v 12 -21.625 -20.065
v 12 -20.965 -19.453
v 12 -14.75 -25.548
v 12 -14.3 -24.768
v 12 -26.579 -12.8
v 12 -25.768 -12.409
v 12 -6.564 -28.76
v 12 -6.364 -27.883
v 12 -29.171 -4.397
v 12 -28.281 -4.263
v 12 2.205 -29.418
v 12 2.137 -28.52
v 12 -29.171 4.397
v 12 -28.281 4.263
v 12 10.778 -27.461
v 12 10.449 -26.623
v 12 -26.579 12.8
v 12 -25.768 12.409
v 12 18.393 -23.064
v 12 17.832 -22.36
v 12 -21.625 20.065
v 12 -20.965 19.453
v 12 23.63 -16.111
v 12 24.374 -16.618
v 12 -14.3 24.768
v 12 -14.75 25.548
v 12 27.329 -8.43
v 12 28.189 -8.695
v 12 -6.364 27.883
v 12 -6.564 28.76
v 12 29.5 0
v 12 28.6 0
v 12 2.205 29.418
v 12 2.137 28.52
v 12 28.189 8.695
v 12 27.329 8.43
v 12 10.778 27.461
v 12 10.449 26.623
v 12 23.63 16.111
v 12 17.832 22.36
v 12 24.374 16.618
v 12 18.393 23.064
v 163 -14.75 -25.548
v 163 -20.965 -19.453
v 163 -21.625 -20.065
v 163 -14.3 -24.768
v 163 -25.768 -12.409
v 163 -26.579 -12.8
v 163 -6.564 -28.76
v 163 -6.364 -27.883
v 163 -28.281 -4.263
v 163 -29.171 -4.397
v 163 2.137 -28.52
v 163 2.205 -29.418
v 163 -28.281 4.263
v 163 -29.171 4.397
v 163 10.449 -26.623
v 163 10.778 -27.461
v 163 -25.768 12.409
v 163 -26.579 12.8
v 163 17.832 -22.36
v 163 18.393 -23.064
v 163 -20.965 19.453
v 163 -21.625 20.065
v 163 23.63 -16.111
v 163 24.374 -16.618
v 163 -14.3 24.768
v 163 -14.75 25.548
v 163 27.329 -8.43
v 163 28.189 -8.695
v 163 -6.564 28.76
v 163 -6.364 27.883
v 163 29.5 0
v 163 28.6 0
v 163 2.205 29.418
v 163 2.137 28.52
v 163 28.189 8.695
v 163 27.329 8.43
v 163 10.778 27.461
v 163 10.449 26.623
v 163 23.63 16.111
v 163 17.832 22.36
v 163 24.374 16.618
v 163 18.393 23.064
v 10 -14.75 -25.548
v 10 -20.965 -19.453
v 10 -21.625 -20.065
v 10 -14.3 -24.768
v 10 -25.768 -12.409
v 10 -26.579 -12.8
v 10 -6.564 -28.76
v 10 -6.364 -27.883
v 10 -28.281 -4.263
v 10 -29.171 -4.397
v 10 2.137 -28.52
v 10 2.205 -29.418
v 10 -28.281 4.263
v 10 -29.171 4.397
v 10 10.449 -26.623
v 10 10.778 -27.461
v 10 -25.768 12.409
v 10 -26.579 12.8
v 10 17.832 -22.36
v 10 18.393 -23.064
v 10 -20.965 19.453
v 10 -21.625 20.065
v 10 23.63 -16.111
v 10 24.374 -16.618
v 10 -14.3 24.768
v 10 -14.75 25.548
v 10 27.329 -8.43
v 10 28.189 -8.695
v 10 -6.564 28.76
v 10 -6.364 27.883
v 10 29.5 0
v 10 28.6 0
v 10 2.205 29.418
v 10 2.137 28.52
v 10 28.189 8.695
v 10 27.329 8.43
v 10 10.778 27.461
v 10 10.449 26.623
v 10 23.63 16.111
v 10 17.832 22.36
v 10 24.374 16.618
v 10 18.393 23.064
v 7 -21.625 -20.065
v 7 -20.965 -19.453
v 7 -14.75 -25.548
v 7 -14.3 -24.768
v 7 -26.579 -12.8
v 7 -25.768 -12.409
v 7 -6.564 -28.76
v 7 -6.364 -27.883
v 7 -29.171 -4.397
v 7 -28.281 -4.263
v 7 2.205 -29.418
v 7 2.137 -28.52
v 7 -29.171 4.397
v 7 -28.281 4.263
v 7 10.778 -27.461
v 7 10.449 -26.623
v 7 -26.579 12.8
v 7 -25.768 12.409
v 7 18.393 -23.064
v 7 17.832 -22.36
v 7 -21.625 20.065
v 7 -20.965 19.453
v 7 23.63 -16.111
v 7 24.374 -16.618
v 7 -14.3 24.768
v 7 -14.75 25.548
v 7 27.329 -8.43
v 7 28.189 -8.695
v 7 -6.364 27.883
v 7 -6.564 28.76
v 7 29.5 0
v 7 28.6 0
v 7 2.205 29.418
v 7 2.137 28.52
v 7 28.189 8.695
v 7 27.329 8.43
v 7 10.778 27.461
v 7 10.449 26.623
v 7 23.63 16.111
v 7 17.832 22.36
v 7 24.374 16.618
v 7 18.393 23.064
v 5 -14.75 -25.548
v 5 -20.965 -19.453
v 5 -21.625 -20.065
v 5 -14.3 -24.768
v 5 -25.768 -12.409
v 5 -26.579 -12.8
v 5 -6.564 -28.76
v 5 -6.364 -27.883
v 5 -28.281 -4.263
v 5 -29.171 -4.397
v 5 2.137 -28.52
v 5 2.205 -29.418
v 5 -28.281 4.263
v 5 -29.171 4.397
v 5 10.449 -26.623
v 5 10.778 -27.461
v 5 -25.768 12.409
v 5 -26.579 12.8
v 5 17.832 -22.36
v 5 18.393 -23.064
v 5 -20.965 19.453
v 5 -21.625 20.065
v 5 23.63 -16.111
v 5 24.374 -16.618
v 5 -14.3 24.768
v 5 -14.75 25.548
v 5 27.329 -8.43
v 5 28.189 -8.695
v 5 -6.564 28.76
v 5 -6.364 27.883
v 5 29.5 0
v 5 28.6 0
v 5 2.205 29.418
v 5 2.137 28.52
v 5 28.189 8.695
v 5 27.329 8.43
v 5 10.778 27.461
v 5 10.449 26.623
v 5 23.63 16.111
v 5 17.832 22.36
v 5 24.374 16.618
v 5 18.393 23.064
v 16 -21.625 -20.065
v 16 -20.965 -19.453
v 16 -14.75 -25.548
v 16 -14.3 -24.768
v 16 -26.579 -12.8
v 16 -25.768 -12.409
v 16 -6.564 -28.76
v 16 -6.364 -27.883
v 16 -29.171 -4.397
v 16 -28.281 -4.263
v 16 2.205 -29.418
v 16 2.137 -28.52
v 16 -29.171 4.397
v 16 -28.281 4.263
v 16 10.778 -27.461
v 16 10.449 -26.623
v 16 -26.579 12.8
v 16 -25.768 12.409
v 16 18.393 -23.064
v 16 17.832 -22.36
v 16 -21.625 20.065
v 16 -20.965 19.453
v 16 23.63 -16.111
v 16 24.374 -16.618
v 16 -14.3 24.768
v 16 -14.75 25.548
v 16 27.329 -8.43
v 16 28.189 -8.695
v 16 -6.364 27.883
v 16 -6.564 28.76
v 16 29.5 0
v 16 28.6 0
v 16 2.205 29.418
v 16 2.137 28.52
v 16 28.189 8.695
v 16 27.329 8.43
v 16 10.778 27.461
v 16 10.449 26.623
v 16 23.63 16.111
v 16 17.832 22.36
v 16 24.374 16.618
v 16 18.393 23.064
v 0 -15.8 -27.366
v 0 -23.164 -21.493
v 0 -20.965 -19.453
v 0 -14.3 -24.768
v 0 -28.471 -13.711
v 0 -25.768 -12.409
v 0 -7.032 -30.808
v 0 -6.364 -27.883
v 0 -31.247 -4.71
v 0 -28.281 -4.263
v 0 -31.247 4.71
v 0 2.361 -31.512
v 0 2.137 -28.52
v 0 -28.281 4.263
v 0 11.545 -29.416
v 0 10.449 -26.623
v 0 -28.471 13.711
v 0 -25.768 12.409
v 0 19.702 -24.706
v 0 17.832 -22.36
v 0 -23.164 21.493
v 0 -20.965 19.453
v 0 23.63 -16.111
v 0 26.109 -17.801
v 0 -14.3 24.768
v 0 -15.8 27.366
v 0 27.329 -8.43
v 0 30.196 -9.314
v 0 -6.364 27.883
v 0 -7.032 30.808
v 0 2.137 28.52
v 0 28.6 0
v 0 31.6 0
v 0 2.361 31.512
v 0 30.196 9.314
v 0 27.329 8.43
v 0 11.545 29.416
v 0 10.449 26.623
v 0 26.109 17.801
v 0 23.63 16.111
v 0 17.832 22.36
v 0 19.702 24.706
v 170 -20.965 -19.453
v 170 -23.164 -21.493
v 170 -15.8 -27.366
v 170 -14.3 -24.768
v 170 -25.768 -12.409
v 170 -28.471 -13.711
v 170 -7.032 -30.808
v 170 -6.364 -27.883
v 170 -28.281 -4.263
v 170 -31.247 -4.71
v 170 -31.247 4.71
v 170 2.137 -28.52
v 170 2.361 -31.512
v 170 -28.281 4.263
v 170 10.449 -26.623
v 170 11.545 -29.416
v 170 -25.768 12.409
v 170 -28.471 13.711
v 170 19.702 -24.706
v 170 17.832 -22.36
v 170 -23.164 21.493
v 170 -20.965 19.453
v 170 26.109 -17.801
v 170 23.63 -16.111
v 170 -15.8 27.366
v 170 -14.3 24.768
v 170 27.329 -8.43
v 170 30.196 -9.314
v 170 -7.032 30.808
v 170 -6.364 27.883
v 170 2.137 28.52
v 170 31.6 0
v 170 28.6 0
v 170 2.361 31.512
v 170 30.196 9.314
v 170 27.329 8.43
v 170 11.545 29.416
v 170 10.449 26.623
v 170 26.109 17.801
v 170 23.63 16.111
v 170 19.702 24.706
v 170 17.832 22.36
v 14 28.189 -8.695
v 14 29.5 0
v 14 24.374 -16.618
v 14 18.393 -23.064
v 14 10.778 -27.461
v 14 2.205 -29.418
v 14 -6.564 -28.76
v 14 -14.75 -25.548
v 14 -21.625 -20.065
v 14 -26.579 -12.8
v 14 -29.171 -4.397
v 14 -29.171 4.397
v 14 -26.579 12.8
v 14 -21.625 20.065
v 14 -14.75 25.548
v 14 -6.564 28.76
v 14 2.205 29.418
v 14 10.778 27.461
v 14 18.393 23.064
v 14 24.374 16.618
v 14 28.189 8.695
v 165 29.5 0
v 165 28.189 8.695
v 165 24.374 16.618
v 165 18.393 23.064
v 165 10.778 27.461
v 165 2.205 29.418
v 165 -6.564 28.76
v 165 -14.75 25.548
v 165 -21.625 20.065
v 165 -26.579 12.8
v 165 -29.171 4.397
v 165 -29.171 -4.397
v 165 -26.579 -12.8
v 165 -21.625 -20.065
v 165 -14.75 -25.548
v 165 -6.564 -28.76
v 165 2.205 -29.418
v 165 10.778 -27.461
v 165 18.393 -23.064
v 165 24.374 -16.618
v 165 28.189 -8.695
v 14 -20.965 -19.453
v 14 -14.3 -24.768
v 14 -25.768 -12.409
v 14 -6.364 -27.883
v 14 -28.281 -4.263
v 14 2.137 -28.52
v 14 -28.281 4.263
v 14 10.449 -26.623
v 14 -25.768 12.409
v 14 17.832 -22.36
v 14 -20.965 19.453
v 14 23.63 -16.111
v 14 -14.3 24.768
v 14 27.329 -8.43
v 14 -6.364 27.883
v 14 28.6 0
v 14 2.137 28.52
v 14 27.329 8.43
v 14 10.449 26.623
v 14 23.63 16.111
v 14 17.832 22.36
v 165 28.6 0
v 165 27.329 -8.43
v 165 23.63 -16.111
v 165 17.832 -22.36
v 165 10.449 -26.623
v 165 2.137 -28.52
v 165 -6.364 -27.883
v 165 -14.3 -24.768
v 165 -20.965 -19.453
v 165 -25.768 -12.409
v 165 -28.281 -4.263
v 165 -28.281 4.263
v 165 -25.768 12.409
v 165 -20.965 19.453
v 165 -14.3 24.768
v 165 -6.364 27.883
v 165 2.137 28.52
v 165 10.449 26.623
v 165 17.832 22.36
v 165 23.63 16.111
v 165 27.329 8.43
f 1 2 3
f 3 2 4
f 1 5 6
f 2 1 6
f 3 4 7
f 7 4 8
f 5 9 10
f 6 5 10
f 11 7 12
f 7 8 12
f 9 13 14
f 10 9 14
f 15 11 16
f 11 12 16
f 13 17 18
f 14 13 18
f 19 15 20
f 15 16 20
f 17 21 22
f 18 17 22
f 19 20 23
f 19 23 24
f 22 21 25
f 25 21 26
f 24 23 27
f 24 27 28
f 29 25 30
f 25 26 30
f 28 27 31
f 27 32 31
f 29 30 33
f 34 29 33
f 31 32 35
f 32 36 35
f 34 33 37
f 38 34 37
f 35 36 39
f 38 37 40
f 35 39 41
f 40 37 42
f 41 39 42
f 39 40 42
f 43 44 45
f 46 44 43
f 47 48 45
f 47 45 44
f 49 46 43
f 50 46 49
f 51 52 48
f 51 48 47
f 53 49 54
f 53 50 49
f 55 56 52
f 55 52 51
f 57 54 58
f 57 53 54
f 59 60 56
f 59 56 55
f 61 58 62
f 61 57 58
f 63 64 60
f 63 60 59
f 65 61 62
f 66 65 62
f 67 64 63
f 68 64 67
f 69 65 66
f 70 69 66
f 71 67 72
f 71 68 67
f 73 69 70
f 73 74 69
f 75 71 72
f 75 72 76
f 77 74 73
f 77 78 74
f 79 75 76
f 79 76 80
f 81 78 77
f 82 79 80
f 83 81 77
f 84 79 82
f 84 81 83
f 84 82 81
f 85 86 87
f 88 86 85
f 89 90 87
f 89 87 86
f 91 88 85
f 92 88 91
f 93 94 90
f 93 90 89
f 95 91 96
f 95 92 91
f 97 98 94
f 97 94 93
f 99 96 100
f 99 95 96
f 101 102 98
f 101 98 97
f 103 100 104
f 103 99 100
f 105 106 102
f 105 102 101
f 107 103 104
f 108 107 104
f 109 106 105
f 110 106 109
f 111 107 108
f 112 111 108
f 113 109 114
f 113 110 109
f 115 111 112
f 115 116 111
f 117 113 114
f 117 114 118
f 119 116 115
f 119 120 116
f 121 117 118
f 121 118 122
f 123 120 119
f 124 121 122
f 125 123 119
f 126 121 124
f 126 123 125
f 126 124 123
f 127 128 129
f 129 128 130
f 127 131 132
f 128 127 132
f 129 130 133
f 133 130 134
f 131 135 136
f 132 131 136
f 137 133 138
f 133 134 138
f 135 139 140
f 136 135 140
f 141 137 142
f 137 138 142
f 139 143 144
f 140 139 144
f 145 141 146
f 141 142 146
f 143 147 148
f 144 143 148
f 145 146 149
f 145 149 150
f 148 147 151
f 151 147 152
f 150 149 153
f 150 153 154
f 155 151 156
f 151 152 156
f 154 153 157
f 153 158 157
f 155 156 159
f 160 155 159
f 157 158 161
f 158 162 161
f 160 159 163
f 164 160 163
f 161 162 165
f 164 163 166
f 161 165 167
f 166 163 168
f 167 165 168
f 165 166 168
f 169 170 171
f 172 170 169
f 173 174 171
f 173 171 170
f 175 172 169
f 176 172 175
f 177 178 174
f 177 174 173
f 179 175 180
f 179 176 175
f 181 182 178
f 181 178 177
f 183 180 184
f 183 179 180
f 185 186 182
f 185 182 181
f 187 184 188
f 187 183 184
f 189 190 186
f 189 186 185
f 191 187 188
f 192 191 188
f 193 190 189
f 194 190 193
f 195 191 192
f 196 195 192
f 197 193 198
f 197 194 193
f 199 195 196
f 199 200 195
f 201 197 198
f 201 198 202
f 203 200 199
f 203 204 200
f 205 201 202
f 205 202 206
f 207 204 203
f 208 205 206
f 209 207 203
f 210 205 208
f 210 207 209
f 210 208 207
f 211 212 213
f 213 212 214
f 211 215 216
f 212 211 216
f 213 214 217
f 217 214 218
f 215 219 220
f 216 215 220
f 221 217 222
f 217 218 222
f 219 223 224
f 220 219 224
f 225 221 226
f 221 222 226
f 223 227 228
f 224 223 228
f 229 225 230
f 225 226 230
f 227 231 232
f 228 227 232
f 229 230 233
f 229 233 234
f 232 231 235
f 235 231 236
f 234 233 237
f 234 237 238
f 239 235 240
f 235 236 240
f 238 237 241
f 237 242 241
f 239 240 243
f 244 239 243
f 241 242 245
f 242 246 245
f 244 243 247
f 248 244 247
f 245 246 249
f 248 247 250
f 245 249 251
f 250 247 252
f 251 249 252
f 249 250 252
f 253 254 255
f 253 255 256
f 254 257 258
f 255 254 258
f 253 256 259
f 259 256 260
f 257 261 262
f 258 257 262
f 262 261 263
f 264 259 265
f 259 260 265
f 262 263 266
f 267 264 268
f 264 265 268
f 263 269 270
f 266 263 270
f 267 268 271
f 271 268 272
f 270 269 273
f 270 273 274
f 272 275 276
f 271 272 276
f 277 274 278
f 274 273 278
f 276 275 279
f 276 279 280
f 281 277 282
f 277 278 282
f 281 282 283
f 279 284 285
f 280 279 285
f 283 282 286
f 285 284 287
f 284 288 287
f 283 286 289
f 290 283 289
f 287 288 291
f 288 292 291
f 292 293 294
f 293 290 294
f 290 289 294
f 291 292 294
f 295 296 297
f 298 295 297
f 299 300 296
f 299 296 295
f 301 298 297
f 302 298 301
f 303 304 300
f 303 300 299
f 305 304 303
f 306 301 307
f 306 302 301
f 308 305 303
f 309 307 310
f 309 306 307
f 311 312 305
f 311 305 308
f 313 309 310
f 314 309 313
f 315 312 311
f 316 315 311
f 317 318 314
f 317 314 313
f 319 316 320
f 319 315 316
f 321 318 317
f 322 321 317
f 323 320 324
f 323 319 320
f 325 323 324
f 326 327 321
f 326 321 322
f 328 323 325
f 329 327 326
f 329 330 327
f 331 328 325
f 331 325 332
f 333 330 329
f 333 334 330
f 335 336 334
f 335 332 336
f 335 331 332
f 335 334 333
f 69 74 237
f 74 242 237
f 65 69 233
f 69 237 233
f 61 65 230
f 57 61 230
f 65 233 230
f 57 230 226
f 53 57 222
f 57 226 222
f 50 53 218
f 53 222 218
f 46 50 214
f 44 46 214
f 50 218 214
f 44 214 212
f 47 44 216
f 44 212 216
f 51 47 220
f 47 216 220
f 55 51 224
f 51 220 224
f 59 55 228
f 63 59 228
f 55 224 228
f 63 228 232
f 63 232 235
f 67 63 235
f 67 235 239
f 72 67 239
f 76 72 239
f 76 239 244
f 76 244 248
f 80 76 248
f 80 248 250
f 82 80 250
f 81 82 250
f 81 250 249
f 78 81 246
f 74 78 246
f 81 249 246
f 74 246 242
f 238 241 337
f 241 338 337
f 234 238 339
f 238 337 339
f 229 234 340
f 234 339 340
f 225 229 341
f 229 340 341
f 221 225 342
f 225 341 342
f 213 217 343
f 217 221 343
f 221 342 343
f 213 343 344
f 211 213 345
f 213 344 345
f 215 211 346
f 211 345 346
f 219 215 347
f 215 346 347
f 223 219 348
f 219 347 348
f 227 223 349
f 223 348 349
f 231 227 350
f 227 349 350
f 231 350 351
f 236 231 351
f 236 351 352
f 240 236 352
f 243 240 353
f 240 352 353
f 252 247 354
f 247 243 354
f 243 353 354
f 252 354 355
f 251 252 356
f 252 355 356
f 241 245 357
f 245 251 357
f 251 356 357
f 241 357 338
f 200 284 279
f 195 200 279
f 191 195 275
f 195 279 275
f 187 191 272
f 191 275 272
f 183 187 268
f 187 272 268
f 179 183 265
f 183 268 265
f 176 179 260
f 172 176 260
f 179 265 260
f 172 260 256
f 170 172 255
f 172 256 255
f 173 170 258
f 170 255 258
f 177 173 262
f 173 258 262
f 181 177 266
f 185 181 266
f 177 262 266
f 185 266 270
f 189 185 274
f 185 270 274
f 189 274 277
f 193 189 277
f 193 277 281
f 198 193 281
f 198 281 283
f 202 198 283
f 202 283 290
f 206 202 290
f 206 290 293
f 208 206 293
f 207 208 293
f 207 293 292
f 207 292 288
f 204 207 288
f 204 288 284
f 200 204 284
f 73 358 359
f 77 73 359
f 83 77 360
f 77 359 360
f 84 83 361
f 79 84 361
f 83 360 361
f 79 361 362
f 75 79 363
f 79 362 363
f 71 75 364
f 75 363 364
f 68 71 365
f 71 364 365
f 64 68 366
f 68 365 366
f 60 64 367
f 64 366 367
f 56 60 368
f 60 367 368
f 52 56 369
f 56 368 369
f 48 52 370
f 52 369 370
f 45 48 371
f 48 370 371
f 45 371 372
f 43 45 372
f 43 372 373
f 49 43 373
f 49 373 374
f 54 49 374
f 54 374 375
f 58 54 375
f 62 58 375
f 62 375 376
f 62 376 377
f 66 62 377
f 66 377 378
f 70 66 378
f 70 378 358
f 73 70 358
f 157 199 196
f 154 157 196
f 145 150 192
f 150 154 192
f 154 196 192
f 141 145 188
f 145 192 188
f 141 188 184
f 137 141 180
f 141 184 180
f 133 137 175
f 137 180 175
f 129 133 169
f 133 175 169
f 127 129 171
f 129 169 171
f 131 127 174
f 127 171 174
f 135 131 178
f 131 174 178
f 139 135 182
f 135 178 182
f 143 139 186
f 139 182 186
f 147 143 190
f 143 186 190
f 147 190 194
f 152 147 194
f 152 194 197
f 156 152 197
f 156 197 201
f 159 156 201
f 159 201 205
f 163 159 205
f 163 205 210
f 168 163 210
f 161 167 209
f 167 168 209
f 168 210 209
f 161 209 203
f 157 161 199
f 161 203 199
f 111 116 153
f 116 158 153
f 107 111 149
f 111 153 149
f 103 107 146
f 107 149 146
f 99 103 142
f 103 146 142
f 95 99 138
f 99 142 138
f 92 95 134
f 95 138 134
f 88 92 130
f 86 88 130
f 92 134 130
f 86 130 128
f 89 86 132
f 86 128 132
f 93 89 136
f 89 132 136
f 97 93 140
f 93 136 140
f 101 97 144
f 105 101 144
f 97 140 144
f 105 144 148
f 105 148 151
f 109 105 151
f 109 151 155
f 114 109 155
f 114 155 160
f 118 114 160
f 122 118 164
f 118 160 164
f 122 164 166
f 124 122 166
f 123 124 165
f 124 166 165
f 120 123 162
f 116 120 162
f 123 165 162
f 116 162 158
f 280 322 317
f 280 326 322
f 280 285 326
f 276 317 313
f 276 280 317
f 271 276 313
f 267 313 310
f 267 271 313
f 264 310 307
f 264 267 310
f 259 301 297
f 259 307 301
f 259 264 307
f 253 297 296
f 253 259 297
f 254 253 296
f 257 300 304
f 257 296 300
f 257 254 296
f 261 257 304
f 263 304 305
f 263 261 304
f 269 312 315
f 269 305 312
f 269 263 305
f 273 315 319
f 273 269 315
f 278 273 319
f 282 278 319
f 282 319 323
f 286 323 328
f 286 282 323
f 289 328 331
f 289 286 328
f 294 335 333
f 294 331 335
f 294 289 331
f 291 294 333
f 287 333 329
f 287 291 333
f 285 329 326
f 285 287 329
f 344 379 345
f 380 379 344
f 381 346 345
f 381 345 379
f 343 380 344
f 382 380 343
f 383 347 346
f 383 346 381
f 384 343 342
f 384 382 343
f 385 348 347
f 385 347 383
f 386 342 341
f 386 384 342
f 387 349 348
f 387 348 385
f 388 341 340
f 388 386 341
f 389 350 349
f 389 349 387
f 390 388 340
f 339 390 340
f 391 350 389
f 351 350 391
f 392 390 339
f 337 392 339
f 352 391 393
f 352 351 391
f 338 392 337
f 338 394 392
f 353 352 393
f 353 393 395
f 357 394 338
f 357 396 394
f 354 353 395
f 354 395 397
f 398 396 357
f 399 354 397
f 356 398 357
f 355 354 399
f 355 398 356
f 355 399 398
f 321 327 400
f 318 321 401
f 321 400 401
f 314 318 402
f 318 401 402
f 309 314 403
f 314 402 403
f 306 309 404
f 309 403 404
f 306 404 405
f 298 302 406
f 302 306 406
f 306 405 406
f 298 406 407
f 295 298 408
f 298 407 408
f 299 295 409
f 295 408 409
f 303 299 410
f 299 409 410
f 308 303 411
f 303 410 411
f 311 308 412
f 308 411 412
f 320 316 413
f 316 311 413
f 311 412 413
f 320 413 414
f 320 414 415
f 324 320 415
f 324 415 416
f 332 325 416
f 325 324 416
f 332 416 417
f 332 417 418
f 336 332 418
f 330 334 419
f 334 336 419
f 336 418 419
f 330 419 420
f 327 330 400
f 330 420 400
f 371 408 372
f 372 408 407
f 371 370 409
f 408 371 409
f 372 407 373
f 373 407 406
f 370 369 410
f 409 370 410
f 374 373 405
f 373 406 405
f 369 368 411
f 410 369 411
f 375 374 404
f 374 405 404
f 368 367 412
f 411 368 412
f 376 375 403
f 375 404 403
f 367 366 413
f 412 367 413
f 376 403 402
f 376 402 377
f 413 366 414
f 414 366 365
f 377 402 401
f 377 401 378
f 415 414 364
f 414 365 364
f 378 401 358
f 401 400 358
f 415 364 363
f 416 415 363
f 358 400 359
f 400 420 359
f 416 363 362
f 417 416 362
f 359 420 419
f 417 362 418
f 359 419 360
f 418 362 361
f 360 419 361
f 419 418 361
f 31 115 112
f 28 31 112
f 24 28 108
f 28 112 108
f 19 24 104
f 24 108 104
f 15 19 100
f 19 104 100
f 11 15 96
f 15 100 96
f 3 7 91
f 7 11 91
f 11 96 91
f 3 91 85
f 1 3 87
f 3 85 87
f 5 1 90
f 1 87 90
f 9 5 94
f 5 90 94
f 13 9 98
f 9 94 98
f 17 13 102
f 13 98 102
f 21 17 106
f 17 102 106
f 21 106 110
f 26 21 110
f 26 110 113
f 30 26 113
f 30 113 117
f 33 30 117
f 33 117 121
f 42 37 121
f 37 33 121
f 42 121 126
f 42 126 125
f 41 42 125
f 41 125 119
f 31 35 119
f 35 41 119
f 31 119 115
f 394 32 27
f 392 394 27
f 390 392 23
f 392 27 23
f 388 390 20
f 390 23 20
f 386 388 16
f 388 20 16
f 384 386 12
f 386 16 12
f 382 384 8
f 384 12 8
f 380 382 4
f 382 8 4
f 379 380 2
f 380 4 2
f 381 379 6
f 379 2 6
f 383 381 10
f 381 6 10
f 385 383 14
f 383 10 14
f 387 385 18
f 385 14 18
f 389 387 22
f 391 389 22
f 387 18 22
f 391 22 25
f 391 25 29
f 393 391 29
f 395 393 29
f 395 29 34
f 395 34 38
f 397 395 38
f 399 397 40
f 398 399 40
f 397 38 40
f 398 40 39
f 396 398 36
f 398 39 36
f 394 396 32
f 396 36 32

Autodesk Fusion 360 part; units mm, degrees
sketch "Sketch1" plane through (0, 0, 0) normal (1, 0, 0) x (0, 1, 0)
  circle A0 centre (0, 0) radius 28.6
  circle A1 centre (0, 0) radius 31.6
  dimension "d9" = 57.2
  dimension "d10" = 63.2
extrude "Extrude1" add sketch "Sketch1" along normal blind 170
ref_plane "WorkPlane1" through (5, 0, 0) normal (1, 0, 0) x (0, 1, 0)
sketch "Sketch2" plane through (5, 0, 0) normal (1, 0, 0) x (0, 1, 0)
  circle A0 centre (0, 0) radius 29.5
  dimension "d14" = 59
extrude "Extrude2" cut sketch "Sketch2" along normal blind 2
ref_plane "WorkPlane2" through (165, 0, 0) normal (1, 0, 0) x (0, 1, 0)
sketch "Sketch3" plane through (165, 0, 0) normal (1, 0, 0) x (0, 1, 0)
  circle A0 centre (0, 0) radius 29.5
  dimension "d18" = 59
extrude "Extrude3" cut sketch "Sketch3" against normal blind 2
sketch "Sketch4" plane through (0, 0, 0) normal (1, 0, 0) x (0, 1, 0)
ref_plane "WorkPlane4" through (0, 0, 0) normal (1, 0, 0) x (0, 1, 0)
ref_plane "WorkPlane5" through (10, 0, 0) normal (1, 0, 0) x (0, 1, 0)
sketch "Sketch5" plane through (10, 0, 0) normal (1, 0, 0) x (0, 1, 0)
  circle A0 centre (0, 0) radius 29.5
  dimension "d24" = 59
extrude "Extrude4" cut sketch "Sketch5" along normal blind 2
ref_plane "WorkPlane6" through (14, 0, 0) normal (1, 0, 0) x (0, 1, 0)
sketch "Sketch6" plane through (14, 0, 0) normal (1, 0, 0) x (0, 1, 0)
  circle A0 centre (0, 0) radius 29.5
  dimension "d28" = 59
extrude "Extrude5" cut sketch "Sketch6" along normal blind 2
